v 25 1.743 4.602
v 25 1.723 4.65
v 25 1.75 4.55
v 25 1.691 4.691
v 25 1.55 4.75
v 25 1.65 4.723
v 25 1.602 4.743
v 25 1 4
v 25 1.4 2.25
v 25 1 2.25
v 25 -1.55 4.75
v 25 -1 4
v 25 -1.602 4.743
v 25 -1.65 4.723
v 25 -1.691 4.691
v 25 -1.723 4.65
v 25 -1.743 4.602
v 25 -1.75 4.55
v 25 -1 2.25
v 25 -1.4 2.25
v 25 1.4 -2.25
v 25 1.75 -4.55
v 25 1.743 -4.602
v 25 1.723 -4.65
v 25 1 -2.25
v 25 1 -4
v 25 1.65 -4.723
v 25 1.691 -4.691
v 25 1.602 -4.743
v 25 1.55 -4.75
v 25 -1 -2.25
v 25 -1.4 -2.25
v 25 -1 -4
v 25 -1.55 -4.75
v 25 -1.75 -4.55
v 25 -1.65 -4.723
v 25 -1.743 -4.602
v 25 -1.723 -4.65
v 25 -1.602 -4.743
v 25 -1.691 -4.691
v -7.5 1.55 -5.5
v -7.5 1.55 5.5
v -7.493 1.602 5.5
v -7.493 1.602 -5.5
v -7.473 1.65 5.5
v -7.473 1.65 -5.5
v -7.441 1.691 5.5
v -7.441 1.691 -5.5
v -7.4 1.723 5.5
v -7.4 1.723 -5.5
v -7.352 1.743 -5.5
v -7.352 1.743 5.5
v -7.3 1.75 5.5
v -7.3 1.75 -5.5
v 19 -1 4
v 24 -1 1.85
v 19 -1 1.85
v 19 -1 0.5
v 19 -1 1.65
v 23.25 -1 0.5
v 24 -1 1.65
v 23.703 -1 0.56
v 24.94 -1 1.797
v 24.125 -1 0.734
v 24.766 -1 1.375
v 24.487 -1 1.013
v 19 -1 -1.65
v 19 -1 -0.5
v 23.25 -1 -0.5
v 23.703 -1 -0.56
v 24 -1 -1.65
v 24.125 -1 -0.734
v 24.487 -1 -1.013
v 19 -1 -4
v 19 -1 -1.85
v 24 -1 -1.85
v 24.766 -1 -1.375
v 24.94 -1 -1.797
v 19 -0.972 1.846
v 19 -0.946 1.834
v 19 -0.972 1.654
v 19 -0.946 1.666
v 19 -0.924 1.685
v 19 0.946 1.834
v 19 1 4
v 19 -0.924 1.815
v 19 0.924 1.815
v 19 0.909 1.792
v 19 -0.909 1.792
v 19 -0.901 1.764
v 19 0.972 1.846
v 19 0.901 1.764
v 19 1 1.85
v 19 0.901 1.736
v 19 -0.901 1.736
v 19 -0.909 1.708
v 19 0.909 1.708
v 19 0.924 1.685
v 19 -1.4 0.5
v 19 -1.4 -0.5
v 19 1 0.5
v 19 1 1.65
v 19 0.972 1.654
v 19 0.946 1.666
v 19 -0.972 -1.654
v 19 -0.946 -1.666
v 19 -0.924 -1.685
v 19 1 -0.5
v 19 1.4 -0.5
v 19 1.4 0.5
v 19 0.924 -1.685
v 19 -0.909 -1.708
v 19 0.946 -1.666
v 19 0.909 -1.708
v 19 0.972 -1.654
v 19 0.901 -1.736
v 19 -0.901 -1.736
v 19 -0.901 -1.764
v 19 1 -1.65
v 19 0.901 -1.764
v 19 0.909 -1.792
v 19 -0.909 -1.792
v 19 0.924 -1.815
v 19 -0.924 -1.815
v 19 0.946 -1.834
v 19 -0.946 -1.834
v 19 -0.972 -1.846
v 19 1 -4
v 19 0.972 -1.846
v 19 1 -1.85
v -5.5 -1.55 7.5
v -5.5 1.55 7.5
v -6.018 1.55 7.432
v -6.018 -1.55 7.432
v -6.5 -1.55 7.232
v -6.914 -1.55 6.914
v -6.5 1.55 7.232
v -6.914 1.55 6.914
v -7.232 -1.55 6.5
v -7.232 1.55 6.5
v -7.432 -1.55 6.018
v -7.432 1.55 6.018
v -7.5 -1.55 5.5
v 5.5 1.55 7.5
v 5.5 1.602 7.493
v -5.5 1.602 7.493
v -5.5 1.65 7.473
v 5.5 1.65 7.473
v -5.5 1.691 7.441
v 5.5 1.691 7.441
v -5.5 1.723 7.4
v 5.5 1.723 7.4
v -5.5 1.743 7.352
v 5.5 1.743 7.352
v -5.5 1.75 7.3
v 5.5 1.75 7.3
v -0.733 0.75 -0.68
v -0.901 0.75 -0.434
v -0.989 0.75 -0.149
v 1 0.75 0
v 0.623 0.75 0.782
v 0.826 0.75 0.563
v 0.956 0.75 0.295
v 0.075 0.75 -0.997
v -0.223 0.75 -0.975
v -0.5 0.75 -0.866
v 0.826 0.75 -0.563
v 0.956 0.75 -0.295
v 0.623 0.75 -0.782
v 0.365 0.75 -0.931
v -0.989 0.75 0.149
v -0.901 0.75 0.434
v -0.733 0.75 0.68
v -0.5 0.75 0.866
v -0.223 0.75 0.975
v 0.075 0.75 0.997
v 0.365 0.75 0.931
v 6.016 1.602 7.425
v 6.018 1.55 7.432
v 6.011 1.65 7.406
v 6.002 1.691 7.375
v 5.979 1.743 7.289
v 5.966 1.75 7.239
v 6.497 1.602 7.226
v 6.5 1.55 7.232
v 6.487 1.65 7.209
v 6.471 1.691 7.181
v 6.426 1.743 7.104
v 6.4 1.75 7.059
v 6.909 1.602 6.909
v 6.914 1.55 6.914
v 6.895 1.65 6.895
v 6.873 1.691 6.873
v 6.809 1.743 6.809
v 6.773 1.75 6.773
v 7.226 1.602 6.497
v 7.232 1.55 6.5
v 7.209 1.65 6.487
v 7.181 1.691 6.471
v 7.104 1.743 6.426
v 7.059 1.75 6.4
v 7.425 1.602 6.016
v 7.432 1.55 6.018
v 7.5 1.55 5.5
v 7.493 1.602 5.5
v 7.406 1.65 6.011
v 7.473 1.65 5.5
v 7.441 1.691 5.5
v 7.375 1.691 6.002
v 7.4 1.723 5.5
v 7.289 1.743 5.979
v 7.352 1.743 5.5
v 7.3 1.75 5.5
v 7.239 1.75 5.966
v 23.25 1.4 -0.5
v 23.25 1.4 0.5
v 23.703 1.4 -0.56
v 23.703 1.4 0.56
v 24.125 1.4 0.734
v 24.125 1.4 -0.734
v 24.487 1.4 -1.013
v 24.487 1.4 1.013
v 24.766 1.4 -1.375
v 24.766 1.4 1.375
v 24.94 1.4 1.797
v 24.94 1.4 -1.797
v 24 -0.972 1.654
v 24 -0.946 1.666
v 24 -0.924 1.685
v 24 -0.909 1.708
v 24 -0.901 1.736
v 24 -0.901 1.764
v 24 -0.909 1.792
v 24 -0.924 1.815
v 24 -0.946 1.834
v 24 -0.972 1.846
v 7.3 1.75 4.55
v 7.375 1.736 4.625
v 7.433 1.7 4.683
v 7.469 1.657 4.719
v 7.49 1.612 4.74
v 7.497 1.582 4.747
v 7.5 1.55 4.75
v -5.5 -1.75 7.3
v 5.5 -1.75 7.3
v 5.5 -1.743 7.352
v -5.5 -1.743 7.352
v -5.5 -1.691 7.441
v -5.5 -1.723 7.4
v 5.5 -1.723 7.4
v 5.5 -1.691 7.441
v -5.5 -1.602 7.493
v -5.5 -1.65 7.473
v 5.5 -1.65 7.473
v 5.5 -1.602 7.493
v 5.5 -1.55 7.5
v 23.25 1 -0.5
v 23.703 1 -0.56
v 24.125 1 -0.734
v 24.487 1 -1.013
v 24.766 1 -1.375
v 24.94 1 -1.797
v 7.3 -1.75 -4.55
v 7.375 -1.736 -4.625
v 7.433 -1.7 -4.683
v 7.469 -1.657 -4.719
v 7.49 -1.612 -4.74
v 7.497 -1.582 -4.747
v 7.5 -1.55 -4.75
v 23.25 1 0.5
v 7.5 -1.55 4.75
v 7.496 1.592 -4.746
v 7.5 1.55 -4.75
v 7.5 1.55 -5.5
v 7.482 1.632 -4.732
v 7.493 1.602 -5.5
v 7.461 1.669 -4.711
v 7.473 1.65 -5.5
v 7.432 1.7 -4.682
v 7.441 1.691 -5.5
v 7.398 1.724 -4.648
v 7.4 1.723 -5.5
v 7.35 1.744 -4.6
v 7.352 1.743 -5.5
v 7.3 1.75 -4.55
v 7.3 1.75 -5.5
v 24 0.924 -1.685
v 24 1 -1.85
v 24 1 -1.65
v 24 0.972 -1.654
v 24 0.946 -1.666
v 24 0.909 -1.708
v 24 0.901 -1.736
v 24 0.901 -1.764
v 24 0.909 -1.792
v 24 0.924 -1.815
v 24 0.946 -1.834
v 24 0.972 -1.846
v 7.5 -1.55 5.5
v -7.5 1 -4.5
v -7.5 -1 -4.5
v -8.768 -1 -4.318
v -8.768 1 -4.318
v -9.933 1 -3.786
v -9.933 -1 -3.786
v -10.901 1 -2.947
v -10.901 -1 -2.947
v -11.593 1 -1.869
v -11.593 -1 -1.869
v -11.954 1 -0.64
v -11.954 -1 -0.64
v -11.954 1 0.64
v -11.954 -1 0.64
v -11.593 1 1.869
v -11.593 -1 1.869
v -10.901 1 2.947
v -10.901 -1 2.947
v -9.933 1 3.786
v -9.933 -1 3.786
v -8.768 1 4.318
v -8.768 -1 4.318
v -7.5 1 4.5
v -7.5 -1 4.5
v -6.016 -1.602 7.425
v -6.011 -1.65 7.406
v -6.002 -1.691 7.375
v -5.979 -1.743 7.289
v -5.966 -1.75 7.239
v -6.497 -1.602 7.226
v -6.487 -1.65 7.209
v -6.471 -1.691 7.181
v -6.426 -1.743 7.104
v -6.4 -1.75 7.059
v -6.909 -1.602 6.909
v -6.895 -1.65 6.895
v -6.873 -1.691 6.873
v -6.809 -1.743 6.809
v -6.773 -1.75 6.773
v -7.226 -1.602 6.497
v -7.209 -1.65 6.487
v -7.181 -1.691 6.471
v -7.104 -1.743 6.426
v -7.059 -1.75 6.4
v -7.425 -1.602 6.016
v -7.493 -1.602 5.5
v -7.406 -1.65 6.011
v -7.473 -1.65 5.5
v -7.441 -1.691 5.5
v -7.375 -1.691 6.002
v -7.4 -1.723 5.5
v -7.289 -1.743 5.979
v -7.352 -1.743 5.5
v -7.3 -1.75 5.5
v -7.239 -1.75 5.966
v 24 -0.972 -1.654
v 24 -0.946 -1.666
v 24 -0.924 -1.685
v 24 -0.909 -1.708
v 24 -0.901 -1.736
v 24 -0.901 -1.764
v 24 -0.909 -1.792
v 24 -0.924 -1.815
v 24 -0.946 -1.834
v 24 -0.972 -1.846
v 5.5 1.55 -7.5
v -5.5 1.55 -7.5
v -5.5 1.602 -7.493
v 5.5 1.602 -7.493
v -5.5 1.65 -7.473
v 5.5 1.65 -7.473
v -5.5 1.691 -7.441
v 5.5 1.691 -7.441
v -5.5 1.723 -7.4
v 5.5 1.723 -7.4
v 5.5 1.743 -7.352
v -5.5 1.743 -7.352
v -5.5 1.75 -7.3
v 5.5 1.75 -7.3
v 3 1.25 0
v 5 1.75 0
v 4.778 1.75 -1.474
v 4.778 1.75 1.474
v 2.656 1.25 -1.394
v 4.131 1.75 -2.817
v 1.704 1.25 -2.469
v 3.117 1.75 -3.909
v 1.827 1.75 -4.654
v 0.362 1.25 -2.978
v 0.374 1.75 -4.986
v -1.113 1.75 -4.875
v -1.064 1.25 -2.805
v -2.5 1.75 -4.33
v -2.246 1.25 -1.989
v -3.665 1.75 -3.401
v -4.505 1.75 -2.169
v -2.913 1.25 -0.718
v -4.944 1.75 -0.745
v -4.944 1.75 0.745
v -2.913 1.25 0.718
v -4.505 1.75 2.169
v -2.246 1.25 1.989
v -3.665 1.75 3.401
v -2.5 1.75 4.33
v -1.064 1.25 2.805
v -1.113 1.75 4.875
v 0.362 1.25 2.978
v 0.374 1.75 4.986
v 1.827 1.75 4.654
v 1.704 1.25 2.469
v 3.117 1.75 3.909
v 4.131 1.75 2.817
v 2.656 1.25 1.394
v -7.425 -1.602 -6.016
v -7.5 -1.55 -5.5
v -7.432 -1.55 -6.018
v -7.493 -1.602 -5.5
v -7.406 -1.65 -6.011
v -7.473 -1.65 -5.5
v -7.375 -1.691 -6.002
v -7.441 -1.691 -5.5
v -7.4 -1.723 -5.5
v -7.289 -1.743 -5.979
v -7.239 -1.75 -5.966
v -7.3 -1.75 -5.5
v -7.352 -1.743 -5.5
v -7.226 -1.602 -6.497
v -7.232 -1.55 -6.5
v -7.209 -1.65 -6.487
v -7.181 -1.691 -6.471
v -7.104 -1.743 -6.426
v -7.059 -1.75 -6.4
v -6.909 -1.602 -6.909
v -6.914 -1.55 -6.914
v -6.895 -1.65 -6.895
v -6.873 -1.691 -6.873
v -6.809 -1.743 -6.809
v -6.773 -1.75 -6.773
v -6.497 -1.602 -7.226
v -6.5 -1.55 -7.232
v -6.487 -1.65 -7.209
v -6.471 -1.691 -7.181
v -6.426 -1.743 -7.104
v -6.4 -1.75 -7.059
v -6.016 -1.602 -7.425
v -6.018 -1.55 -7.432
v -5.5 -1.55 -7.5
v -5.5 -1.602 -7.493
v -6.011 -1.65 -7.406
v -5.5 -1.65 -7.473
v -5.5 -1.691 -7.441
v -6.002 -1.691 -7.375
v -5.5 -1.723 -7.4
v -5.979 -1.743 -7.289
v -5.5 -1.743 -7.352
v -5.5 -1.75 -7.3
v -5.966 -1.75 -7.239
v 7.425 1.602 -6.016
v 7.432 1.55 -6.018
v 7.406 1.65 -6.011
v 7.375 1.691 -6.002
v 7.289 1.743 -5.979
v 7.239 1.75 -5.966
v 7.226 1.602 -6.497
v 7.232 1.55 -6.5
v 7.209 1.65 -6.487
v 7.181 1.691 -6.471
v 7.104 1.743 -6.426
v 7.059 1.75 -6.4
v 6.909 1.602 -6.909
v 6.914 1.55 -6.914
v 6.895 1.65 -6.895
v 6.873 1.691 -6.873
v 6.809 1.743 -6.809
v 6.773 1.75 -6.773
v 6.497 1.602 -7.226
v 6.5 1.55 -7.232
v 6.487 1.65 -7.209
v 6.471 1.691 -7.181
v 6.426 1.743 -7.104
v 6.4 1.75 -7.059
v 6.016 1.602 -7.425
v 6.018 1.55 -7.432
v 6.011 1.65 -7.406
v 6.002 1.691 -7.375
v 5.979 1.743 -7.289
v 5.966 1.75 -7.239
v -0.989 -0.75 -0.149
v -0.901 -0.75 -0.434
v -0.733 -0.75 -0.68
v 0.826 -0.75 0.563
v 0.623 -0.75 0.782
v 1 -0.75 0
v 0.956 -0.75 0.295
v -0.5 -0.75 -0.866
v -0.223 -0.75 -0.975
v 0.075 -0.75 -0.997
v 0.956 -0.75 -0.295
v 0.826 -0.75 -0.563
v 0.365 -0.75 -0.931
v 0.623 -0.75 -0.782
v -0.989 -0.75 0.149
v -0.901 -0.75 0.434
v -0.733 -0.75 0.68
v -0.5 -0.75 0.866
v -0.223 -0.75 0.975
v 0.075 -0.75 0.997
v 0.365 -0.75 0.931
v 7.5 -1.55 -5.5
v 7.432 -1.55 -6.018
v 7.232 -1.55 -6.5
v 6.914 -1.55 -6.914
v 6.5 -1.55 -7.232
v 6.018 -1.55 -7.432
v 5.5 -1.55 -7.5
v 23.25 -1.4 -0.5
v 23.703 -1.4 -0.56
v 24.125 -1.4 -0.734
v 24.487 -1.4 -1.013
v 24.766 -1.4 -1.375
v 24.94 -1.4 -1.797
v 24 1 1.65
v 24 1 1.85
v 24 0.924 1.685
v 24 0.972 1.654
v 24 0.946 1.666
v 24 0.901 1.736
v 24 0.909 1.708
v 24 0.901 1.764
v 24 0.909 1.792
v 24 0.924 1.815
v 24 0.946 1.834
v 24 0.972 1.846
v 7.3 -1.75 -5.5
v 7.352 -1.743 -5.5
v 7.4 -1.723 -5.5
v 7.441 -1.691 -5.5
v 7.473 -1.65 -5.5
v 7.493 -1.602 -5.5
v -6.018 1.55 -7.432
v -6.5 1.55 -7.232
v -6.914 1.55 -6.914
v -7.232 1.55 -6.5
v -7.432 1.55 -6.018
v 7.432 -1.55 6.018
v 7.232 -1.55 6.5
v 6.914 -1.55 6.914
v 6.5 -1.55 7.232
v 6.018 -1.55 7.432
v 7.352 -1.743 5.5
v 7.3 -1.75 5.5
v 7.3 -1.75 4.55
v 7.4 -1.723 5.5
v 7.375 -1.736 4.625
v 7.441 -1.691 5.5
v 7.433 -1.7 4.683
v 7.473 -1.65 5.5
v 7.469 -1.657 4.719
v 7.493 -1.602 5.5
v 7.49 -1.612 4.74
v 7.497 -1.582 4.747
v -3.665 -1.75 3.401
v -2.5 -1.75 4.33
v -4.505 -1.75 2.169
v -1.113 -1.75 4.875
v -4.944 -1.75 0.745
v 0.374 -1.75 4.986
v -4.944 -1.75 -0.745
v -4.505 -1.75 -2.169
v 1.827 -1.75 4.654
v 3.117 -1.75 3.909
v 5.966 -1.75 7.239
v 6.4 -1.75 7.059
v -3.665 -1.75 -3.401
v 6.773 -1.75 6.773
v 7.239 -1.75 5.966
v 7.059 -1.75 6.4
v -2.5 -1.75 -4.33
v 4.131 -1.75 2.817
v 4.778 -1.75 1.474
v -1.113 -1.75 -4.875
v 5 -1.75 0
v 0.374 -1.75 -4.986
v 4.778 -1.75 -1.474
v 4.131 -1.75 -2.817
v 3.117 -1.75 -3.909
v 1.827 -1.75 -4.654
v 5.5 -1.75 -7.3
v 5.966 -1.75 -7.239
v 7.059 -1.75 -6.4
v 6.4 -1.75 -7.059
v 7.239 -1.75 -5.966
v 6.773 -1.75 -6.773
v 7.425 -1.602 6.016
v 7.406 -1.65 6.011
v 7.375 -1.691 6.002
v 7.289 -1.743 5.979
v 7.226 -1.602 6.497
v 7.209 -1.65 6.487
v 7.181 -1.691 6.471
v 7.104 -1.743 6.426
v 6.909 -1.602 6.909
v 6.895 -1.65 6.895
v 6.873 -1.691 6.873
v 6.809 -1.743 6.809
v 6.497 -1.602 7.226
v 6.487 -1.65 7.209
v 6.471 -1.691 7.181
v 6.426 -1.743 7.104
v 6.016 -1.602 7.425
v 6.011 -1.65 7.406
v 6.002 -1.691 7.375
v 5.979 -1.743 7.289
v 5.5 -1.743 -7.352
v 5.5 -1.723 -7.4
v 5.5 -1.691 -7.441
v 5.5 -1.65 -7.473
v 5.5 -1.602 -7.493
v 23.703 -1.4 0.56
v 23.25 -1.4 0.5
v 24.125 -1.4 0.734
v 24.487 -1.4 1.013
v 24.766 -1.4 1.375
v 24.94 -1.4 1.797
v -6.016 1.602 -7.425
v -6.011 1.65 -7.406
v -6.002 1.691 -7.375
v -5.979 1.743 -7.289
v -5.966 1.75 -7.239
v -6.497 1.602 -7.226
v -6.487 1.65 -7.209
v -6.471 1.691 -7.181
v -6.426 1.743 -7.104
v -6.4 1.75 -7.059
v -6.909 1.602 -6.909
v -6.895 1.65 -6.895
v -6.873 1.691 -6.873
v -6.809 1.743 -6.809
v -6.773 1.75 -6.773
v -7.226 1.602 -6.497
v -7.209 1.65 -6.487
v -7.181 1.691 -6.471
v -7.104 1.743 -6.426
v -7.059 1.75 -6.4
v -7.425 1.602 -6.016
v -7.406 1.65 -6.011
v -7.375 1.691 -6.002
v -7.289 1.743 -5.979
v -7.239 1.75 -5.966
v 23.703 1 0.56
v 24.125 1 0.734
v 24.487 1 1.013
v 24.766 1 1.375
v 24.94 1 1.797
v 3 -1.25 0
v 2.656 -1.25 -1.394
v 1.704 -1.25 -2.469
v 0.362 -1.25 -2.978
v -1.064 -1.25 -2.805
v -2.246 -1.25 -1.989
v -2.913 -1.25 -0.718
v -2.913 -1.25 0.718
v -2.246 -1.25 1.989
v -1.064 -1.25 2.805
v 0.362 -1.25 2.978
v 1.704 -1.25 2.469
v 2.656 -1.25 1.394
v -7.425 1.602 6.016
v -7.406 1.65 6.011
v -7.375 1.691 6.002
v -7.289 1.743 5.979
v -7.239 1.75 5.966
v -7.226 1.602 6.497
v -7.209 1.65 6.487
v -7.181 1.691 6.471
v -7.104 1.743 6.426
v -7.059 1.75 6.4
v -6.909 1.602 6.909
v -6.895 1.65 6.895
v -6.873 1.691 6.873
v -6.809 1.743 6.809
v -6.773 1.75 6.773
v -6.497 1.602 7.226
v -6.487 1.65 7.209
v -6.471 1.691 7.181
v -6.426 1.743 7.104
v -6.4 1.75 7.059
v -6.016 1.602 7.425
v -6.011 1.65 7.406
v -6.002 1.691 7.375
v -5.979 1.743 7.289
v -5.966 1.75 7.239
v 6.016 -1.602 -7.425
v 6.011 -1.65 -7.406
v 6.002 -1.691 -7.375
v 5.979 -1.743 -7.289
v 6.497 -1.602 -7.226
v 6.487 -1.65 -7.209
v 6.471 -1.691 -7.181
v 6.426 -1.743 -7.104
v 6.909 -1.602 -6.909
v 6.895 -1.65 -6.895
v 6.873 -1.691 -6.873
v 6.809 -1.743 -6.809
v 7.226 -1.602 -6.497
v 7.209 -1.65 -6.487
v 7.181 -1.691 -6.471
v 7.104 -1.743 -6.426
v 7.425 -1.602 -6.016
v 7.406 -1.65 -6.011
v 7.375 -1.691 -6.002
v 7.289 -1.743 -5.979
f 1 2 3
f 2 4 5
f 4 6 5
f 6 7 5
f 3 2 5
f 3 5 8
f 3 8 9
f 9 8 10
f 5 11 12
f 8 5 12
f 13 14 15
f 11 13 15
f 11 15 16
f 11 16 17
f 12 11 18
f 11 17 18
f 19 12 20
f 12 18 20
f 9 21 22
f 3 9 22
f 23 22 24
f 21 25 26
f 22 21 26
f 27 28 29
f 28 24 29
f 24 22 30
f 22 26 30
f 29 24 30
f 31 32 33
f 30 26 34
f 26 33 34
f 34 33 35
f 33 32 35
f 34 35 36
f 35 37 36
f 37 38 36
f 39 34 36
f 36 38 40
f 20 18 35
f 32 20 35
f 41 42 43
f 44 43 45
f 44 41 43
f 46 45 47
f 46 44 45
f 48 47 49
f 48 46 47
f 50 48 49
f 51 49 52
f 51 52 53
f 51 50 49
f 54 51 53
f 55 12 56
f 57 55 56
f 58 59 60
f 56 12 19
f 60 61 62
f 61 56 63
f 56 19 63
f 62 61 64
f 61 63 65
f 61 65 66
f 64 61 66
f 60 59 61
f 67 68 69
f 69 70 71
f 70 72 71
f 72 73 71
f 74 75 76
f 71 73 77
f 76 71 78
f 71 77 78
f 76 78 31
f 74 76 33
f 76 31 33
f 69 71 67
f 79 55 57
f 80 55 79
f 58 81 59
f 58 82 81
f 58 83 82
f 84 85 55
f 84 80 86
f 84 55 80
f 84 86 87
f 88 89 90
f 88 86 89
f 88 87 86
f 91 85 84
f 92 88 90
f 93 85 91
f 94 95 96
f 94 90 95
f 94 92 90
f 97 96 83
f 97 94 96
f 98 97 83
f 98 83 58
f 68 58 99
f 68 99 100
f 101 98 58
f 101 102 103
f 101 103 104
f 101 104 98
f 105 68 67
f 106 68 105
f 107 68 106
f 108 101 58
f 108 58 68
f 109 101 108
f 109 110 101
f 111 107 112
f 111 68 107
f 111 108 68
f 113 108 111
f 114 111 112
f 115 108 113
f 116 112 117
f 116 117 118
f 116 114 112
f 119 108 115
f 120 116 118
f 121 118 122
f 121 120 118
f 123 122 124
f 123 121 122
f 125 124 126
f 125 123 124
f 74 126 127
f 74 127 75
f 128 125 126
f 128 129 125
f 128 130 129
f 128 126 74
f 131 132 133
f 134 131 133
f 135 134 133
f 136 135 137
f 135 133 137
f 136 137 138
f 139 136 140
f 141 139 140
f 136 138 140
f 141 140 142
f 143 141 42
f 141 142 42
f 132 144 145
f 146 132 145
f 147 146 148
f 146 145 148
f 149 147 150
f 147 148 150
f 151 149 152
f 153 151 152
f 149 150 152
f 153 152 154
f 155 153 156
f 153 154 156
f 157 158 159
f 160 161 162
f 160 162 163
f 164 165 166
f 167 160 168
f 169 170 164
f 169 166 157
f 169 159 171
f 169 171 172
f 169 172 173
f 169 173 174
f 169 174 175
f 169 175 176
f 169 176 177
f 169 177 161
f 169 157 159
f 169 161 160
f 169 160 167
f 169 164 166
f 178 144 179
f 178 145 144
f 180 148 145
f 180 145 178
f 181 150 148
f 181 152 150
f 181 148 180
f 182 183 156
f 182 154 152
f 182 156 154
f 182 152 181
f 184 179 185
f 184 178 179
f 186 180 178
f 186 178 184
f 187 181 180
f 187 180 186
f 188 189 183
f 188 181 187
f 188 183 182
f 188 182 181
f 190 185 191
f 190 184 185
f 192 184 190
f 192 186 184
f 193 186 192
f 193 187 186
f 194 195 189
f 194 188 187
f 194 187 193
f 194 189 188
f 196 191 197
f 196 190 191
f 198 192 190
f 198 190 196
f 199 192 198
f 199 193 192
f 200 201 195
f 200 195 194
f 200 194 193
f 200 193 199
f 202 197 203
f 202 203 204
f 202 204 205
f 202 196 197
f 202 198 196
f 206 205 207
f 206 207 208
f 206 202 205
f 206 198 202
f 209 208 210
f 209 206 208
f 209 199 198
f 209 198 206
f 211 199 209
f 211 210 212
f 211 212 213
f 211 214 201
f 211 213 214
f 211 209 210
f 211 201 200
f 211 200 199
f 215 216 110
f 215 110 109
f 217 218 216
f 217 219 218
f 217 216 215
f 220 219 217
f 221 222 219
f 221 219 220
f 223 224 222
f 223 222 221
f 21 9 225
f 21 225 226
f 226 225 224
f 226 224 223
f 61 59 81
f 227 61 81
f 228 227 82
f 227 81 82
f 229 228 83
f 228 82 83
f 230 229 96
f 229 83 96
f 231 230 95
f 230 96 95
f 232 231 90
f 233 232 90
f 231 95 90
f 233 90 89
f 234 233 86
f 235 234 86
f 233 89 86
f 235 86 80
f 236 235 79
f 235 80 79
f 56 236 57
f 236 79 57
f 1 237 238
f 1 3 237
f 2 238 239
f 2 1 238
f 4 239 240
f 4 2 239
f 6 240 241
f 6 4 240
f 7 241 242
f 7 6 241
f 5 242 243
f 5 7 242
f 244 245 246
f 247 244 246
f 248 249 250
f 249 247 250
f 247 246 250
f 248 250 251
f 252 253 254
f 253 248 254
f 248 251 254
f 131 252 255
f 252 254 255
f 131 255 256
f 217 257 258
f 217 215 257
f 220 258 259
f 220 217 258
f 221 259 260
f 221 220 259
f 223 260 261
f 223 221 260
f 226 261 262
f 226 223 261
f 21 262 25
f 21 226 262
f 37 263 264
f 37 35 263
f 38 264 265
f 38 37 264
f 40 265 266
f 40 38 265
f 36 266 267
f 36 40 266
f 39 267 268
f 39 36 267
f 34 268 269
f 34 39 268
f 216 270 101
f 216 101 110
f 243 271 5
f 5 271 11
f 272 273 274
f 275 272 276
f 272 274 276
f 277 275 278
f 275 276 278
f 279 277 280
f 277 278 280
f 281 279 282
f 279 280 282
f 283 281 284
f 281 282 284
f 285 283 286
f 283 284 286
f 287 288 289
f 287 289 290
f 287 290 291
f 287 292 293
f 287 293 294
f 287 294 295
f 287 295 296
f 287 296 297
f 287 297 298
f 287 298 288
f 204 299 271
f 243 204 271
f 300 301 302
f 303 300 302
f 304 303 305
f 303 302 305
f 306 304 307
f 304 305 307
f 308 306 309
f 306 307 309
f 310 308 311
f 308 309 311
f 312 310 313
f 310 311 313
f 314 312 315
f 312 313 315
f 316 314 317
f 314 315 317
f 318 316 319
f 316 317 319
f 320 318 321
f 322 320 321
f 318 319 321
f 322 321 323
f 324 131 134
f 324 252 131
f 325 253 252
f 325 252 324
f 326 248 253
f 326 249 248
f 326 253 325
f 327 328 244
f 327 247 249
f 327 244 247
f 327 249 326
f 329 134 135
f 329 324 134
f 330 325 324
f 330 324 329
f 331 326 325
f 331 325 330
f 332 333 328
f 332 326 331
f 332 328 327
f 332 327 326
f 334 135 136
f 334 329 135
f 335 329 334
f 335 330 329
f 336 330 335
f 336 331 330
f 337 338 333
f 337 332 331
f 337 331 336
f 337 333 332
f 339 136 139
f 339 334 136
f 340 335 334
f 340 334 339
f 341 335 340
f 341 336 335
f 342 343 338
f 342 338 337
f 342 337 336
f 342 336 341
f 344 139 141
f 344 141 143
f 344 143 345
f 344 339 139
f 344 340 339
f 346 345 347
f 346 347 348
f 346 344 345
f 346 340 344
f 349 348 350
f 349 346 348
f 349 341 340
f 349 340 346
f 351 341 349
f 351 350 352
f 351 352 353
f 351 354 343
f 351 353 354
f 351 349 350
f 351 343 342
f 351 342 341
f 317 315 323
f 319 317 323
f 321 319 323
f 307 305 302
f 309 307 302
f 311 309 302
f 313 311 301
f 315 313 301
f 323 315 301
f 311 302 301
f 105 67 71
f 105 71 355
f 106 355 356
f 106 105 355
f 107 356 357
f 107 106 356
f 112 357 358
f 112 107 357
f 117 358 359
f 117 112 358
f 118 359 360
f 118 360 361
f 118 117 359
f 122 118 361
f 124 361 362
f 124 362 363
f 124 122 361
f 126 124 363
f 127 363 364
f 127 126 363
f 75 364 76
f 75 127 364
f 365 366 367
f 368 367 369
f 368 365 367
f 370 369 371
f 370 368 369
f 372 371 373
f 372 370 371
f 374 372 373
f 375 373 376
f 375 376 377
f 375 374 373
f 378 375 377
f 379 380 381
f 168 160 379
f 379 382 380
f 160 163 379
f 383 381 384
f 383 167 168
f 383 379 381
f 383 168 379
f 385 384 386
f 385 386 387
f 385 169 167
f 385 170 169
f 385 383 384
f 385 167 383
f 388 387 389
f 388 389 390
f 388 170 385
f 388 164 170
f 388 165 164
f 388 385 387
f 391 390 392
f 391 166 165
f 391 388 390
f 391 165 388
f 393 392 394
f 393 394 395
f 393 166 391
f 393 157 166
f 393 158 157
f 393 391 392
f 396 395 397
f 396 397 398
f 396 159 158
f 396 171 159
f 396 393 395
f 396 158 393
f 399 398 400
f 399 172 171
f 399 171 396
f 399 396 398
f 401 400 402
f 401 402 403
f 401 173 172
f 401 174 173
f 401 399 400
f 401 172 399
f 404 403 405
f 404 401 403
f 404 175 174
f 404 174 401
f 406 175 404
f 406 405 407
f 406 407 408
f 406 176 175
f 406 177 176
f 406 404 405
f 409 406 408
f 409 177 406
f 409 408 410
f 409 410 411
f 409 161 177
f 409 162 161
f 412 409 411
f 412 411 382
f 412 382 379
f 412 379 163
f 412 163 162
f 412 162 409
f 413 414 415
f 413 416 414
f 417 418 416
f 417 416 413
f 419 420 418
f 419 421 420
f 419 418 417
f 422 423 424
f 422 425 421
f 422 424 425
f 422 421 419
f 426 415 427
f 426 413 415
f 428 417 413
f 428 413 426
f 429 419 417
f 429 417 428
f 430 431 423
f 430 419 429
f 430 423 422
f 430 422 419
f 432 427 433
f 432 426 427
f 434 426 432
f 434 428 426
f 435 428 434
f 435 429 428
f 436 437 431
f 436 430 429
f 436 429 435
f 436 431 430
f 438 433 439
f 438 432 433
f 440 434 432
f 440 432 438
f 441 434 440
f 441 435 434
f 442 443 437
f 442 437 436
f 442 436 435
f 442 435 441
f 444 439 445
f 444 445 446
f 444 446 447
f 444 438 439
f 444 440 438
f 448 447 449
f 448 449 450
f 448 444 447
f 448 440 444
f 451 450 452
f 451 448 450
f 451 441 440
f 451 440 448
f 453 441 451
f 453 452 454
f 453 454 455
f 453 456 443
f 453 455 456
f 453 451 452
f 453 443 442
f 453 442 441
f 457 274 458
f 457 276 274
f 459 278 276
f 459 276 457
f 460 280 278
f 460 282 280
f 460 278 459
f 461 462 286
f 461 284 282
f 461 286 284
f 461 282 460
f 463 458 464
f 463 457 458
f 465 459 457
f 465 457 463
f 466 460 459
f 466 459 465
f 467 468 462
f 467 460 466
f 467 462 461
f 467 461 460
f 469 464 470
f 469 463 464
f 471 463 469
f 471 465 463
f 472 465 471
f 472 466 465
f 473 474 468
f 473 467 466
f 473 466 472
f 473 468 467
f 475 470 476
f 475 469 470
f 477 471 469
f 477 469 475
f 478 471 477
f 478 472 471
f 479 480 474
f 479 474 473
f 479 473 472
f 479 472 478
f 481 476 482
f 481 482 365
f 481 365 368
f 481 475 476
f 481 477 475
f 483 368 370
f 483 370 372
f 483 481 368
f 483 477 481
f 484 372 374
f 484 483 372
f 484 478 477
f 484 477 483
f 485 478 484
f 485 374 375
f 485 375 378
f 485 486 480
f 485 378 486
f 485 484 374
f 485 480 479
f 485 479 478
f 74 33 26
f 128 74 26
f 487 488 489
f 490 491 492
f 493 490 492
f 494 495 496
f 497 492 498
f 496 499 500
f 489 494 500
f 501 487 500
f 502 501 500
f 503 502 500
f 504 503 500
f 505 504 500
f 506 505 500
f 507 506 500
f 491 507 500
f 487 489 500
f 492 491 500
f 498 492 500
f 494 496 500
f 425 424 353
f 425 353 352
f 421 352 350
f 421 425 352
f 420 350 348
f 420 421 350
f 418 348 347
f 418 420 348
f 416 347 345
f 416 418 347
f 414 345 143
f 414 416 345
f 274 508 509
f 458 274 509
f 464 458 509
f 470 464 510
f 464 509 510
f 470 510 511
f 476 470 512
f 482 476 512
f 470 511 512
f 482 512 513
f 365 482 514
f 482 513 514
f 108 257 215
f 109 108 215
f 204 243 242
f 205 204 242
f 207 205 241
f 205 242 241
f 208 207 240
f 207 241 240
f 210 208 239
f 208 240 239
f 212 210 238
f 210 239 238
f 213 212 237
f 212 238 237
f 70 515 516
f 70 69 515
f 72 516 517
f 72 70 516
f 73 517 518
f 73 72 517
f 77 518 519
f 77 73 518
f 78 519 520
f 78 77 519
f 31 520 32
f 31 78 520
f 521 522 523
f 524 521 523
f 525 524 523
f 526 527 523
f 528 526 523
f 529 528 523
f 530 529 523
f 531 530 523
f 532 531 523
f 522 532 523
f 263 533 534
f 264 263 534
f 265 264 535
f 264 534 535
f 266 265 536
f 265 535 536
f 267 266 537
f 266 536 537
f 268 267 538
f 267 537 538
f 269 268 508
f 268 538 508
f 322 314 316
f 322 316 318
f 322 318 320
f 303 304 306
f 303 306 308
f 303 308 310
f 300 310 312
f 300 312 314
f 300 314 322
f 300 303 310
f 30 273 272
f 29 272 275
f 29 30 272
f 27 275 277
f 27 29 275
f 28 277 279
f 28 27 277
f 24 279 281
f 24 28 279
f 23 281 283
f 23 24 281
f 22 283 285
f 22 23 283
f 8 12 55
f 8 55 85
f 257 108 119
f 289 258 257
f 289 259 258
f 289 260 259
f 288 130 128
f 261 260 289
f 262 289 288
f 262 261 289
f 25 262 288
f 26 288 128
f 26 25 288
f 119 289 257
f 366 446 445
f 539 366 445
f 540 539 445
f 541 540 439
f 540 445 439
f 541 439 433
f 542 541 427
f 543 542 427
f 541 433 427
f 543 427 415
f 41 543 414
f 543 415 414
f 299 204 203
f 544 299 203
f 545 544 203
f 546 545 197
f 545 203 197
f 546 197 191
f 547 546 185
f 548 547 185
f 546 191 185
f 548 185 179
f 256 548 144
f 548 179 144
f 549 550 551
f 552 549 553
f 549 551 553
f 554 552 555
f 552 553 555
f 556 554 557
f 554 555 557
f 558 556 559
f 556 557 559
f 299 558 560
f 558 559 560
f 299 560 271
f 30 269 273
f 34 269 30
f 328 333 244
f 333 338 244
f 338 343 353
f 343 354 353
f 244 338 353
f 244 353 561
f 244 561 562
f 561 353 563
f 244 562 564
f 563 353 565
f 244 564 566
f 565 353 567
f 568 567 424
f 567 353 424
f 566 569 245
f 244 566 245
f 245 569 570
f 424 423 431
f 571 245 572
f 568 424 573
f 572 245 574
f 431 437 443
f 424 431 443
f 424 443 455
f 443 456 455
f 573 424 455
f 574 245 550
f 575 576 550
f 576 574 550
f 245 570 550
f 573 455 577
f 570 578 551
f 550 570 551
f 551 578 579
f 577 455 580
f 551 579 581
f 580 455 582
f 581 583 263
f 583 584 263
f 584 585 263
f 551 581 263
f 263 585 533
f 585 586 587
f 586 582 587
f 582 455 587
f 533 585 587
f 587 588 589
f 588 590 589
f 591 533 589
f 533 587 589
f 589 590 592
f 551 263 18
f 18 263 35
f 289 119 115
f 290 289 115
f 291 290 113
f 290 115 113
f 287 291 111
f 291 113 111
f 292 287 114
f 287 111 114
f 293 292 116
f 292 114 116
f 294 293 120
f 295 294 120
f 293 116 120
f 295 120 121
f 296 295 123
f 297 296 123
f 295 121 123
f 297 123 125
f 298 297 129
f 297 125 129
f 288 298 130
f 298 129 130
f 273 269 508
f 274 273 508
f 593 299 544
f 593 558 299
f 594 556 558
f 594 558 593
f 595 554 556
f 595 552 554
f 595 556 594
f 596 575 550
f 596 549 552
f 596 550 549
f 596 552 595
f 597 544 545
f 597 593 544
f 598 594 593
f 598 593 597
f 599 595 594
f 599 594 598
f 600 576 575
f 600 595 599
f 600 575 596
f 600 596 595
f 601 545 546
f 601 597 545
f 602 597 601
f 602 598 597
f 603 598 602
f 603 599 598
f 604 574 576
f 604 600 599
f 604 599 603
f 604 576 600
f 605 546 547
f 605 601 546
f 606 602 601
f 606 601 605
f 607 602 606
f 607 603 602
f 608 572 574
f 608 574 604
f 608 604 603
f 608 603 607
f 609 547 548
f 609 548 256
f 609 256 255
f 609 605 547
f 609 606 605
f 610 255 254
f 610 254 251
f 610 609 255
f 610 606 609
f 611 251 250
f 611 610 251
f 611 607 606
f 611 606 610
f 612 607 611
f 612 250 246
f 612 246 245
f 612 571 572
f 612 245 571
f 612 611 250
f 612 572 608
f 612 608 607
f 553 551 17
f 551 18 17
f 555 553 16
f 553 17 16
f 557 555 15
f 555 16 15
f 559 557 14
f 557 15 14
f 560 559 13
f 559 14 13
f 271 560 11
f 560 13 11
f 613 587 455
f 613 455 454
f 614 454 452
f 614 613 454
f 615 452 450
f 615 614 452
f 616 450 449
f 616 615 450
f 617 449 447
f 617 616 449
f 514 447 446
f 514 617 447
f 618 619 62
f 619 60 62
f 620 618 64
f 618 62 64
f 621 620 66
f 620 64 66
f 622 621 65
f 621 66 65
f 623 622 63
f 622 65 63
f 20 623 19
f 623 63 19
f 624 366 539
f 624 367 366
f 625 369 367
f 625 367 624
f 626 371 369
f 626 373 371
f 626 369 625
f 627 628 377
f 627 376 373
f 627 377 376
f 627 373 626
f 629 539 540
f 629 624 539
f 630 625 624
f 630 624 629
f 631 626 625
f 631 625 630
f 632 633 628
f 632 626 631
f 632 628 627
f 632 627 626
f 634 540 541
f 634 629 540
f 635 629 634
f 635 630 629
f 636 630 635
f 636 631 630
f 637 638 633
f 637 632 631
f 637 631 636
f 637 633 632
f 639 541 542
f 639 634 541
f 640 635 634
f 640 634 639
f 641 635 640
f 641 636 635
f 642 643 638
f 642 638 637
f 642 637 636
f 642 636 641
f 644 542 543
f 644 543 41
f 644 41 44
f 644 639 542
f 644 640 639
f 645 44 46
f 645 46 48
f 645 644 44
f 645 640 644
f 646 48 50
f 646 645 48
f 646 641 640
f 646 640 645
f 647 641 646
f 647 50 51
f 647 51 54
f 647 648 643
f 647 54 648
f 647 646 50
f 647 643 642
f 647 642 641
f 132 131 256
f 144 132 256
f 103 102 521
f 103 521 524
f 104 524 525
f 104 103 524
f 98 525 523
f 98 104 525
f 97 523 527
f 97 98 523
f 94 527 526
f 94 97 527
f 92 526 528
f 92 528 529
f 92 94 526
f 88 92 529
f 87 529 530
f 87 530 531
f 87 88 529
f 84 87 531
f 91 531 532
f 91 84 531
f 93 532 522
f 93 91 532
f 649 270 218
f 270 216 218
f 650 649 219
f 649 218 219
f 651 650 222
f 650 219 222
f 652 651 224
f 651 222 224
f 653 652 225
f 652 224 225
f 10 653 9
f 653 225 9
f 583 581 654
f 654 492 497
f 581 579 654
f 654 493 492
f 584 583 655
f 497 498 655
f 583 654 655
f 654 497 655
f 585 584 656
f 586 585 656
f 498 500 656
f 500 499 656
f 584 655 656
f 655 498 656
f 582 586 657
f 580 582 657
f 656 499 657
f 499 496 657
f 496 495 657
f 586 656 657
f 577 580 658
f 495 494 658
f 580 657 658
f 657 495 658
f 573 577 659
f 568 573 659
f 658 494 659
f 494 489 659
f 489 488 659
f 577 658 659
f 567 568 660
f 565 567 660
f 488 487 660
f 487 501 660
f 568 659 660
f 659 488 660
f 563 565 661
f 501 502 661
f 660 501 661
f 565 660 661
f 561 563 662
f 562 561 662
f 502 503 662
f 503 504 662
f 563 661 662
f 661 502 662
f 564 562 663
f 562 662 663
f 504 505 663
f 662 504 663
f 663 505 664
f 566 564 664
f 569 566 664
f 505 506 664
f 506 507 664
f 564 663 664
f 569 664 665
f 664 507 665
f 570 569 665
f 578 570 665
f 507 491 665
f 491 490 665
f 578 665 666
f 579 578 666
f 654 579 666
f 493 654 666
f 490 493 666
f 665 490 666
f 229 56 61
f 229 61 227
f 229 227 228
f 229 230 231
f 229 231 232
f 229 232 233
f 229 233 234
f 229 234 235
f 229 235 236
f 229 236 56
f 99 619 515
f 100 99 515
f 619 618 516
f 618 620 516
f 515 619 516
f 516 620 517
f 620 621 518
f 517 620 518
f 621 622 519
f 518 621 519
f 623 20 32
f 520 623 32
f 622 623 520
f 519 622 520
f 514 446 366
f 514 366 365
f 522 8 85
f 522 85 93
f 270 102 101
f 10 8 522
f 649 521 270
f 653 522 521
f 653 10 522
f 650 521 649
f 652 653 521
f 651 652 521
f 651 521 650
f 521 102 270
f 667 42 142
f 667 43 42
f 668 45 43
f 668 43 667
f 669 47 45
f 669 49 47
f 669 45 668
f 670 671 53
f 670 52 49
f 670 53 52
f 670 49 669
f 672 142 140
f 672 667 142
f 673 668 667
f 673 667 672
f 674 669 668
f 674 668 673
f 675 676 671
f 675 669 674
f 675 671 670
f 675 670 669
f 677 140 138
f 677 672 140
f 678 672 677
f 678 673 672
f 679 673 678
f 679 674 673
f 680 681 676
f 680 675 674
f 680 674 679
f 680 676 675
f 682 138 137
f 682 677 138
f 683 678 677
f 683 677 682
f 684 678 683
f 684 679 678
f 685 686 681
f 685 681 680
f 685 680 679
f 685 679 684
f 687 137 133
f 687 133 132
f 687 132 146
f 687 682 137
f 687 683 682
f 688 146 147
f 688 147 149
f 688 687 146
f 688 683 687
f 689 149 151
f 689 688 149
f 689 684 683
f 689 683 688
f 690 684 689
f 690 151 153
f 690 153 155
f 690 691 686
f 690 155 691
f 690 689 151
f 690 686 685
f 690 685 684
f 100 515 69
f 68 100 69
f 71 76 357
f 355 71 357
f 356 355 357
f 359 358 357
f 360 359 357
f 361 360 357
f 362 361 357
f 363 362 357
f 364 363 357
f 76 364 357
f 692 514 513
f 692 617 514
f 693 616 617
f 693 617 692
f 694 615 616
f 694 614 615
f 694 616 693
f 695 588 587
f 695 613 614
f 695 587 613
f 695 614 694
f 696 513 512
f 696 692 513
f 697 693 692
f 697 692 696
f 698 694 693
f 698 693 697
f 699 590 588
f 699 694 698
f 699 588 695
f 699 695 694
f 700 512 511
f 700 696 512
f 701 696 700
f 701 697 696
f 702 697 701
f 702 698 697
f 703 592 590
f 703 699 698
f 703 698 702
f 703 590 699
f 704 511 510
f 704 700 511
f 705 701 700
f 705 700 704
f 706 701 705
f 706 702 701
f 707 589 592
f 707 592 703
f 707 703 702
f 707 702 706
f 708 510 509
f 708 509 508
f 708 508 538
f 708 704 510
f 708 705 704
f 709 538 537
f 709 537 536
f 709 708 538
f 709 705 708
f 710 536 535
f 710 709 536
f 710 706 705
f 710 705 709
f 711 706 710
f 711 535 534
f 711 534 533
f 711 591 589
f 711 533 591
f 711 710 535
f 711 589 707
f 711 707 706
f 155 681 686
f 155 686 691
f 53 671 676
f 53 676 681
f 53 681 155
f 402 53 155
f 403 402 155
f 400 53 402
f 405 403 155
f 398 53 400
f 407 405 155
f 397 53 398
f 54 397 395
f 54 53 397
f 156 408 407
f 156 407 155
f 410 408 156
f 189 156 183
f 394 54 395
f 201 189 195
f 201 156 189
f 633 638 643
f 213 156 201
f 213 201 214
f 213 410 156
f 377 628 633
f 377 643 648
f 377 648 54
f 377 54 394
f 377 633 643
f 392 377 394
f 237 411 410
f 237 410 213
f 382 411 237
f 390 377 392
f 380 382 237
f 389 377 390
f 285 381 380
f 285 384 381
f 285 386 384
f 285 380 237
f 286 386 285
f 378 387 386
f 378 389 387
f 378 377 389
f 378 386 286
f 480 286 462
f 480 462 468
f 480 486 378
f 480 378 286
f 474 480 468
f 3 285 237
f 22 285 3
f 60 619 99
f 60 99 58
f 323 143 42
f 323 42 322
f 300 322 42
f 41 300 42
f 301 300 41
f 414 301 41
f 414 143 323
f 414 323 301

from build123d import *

# Parameters (mm, degrees)
EXTRUDE_1_DEPTH          = 1.75
EXTRUDE_1_DEPTH_BACK     = 1.75
SKETCH_1_W               = 15
SKETCH_1_H               = 15
EXTRUDE_2_DEPTH          = 1
EXTRUDE_2_DEPTH_BACK     = 1
SKETCH_2_R               = 4.5
EXTRUDE_3_DEPTH          = 1.75
EXTRUDE_3_DEPTH_BACK     = 1.75
SKETCH_3_W               = 17.5
SKETCH_3_H               = 9.5
SKETCH_4_R               = 5
SKETCH_5_R               = 1
SKETCH_6_W               = 8
SKETCH_6_H               = 2
CUT_EXTRUDE_1_DEPTH      = 6
SKETCH_7_W               = 1
SKETCH_7_H               = 2.8
CUT_EXTRUDE_2_DEPTH      = 6
SKETCH_8_R               = 0.1
EXTRUDE_4_DEPTH          = 5
MIRROR_3_COPY_1_SKETCH_R = 0.1
MIRROR_3_COPY_1_DEPTH    = 5
FILLET_1_R               = 1.75
FILLET_2_R               = 0.2
FILLET_3_R               = 2


with BuildPart() as part:
    # 草图1 → 凸台-拉伸1 (new, two sides: drawn at the far end of the back side and taken through both)
    with BuildSketch(Plane(origin=(0, 0, 0), x_dir=(1, 0, 0), z_dir=(0, 1, 0)).offset(-EXTRUDE_1_DEPTH_BACK)):
        Rectangle(SKETCH_1_W, SKETCH_1_H)
    extrude(amount=EXTRUDE_1_DEPTH + EXTRUDE_1_DEPTH_BACK)

    # 草图2 → 凸台-拉伸2 (add, two sides: drawn at the far end of the back side and taken through both)
    with BuildSketch(Plane(origin=(0, 0, 0), x_dir=(1, 0, 0), z_dir=(0, 1, 0)).offset(-EXTRUDE_2_DEPTH_BACK)):
        with Locations((-7.5, 0)):
            Circle(SKETCH_2_R)
    extrude(amount=EXTRUDE_2_DEPTH + EXTRUDE_2_DEPTH_BACK)

    # 草图3 → 凸台-拉伸3 (add, two sides: drawn at the far end of the back side and taken through both)
    with BuildSketch(Plane(origin=(0, 0, 0), x_dir=(1, 0, 0), z_dir=(0, 1, 0)).offset(-EXTRUDE_3_DEPTH_BACK)):
        with Locations((16.25, 0)):
            Rectangle(SKETCH_3_W, SKETCH_3_H)
    extrude(amount=EXTRUDE_3_DEPTH + EXTRUDE_3_DEPTH_BACK)

    # 草图4 → 切除-放样1 section 0
    with BuildSketch(Plane(origin=(0, 1.75, 0), x_dir=(1, 0, 0), z_dir=(0, 1, 0))):
        Circle(SKETCH_4_R)
    # 草图5 → 切除-放样1 section 1
    with BuildSketch(Plane(origin=(0, 0.75, 0), x_dir=(1, 0, 0), z_dir=(0, 1, 0))):
        Circle(SKETCH_5_R)
    loft_1 = loft(mode=Mode.SUBTRACT)

    # 镜向1: 切除-放样1 across plane
    add(loft_1.mirror(Plane.ZX), mode=Mode.SUBTRACT)

    # 草图6 → 切除-拉伸1 (cut)
    with BuildSketch(Plane(origin=(25, 0, 0), x_dir=(0, 0, -1), z_dir=(1, 0, 0))):
        Rectangle(SKETCH_6_W, SKETCH_6_H)
    extrude(amount=-CUT_EXTRUDE_1_DEPTH, mode=Mode.SUBTRACT)

    # 草图7 → 切除-拉伸2 (cut)
    with BuildSketch(Plane(origin=(25, 0, 0), x_dir=(0, 0, -1), z_dir=(1, 0, 0))):
        Rectangle(SKETCH_7_W, SKETCH_7_H)
    extrude(amount=-CUT_EXTRUDE_2_DEPTH, mode=Mode.SUBTRACT)

    # 草图8 → 凸台-拉伸4 (add)
    with BuildSketch(Plane(origin=(19, 0, 0), x_dir=(0, 0, -1), z_dir=(1, 0, 0))):
        with Locations((-1.75, -1)):
            Circle(SKETCH_8_R)
    extrude_4 = extrude(amount=EXTRUDE_4_DEPTH)

    # 镜向2: 凸台-拉伸4 across plane
    add(extrude_4.mirror(Plane.XY))

    # 镜向3: 凸台-拉伸4 across plane
    add(extrude_4.mirror(Plane.ZX))

    # 镜向3 copy 1 sketch → 镜向3 copy 1 (add)
    with BuildSketch(Plane(origin=(19, 0, 0), x_dir=(0, 0, 1), z_dir=(1, 0, 0))):
        with Locations((-1.75, -1)):
            Circle(MIRROR_3_COPY_1_SKETCH_R)
    extrude(amount=MIRROR_3_COPY_1_DEPTH)

    # 圆角1
    fillet_1_edges = [part.edges().sort_by_distance(p)[0] for p in [
        (25, 1.2, 0.5),
        (25, 1.2, -0.5),
        (25, -1.2, -0.5),
        (25, -1.2, 0.5),
    ]]
    fillet(fillet_1_edges, radius=FILLET_1_R)

    # 圆角2
    fillet_2_edges = [part.edges().sort_by_distance(p)[0] for p in [
        (-7.5, -1.75, 0),
        (0, -1.75, 7.5),
        (0, -1.75, -7.5),
        (7.5, -1.75, -6.125),
        (7.5, -1.75, 6.125),
        (16.25, 1.75, 4.75),
        (16.25, -1.75, 4.75),
        (16.25, 1.75, -4.75),
        (16.25, -1.75, -4.75),
        (7.5, 1.75, 6.125),
        (7.5, 1.75, -6.125),
        (0, 1.75, -7.5),
        (0, 1.75, 7.5),
        (-7.5, 1.75, 0),
    ]]
    fillet(fillet_2_edges, radius=FILLET_2_R)

    # 圆角3
    # the kernel refuses this fillet: 2 mm, written as the material it takes off along each edge
    with BuildSketch(Plane(origin=(5.5, -1.75, -5.5), x_dir=(0, 0, -1), z_dir=(-1, 0, 0))) as fillet_3_piece_1:
        with BuildLine():
            CenterArc((1.8, -0.2), 0.2, 0, 90)
            Line((2, -0.2), (2, 0))
            Line((2, 0), (1.8, 0))
        make_face()
    revolve(axis=Axis((5.5, -1.75, -5.5), (0, -1, 0)), revolution_arc=90, mode=Mode.SUBTRACT)
    with BuildSketch(Plane(origin=(5.5, -1.75, 5.5), x_dir=(1, 0, 0), z_dir=(0, 0, -1))) as fillet_3_piece_2:
        with BuildLine():
            CenterArc((1.8, -0.2), 0.2, 0, 90)
            Line((2, -0.2), (2, 0))
            Line((2, 0), (1.8, 0))
        make_face()
    revolve(axis=Axis((5.5, -1.75, 5.5), (0, -1, 0)), revolution_arc=90, mode=Mode.SUBTRACT)
    with BuildSketch(Plane(origin=(-5.5, -1.75, -5.5), x_dir=(-1, 0, 0), z_dir=(0, 0, 1))) as fillet_3_piece_3:
        with BuildLine():
            CenterArc((1.8, -0.2), 0.2, 0, 90)
            Line((2, -0.2), (2, 0))
            Line((2, 0), (1.8, 0))
        make_face()
    revolve(axis=Axis((-5.5, -1.75, -5.5), (0, -1, 0)), revolution_arc=90, mode=Mode.SUBTRACT)
    with BuildSketch(Plane(origin=(-5.5, -1.75, 5.5), x_dir=(0, 0, 1), z_dir=(1, 0, 0))) as fillet_3_piece_4:
        with BuildLine():
            CenterArc((1.8, -0.2), 0.2, 0, 90)
            Line((2, -0.2), (2, 0))
            Line((2, 0), (1.8, 0))
        make_face()
    revolve(axis=Axis((-5.5, -1.75, 5.5), (0, -1, 0)), revolution_arc=90, mode=Mode.SUBTRACT)
    with BuildSketch(Plane(origin=(5.5, 1.75, -5.5), x_dir=(1, 0, 0), z_dir=(0, 0, 1))) as fillet_3_piece_5:
        with BuildLine():
            CenterArc((1.8, -0.2), 0.2, 0, 90)
            Line((2, -0.2), (2, 0))
            Line((2, 0), (1.8, 0))
        make_face()
    revolve(axis=Axis((5.5, 1.75, -5.5), (0, 1, 0)), revolution_arc=90, mode=Mode.SUBTRACT)
    with BuildSketch(Plane(origin=(-5.5, 1.75, -5.5), x_dir=(0, 0, -1), z_dir=(1, 0, 0))) as fillet_3_piece_6:
        with BuildLine():
            CenterArc((1.8, -0.2), 0.2, 0, 90)
            Line((2, -0.2), (2, 0))
            Line((2, 0), (1.8, 0))
        make_face()
    revolve(axis=Axis((-5.5, 1.75, -5.5), (0, 1, 0)), revolution_arc=90, mode=Mode.SUBTRACT)
    with BuildSketch(Plane(origin=(-5.5, 1.75, 5.5), x_dir=(-1, 0, 0), z_dir=(0, 0, -1))) as fillet_3_piece_7:
        with BuildLine():
            CenterArc((1.8, -0.2), 0.2, 0, 90)
            Line((2, -0.2), (2, 0))
            Line((2, 0), (1.8, 0))
        make_face()
    revolve(axis=Axis((-5.5, 1.75, 5.5), (0, 1, 0)), revolution_arc=90, mode=Mode.SUBTRACT)
    with BuildSketch(Plane(origin=(5.5, 1.75, 5.5), x_dir=(0, 0, 1), z_dir=(-1, 0, 0))) as fillet_3_piece_8:
        with BuildLine():
            CenterArc((1.8, -0.2), 0.2, 0, 90)
            Line((2, -0.2), (2, 0))
            Line((2, 0), (1.8, 0))
        make_face()
    revolve(axis=Axis((5.5, 1.75, 5.5), (0, 1, 0)), revolution_arc=90, mode=Mode.SUBTRACT)
    with BuildSketch(Plane(origin=(-7.5, 1.75, 7.5), x_dir=(1, 0, 0), z_dir=(0, -1, 0)), Plane(origin=(-7.5, -1.75, -7.5), x_dir=(1, 0, 0), z_dir=(0, 1, 0)), Plane(origin=(7.5, 1.75, 7.5), x_dir=(0, 0, -1), z_dir=(0, -1, 0)), Plane(origin=(7.5, -1.75, -7.5), x_dir=(0, 0, 1), z_dir=(0, 1, 0))) as fillet_3_piece_9:
        with BuildLine():
            CenterArc((FILLET_3_R, -FILLET_3_R), FILLET_3_R, 90, 90)
            Line((0, -FILLET_3_R), (0, 0))
            Line((0, 0), (FILLET_3_R, 0))
        make_face()
    extrude(amount=3.5, mode=Mode.SUBTRACT)


solid = part.part
